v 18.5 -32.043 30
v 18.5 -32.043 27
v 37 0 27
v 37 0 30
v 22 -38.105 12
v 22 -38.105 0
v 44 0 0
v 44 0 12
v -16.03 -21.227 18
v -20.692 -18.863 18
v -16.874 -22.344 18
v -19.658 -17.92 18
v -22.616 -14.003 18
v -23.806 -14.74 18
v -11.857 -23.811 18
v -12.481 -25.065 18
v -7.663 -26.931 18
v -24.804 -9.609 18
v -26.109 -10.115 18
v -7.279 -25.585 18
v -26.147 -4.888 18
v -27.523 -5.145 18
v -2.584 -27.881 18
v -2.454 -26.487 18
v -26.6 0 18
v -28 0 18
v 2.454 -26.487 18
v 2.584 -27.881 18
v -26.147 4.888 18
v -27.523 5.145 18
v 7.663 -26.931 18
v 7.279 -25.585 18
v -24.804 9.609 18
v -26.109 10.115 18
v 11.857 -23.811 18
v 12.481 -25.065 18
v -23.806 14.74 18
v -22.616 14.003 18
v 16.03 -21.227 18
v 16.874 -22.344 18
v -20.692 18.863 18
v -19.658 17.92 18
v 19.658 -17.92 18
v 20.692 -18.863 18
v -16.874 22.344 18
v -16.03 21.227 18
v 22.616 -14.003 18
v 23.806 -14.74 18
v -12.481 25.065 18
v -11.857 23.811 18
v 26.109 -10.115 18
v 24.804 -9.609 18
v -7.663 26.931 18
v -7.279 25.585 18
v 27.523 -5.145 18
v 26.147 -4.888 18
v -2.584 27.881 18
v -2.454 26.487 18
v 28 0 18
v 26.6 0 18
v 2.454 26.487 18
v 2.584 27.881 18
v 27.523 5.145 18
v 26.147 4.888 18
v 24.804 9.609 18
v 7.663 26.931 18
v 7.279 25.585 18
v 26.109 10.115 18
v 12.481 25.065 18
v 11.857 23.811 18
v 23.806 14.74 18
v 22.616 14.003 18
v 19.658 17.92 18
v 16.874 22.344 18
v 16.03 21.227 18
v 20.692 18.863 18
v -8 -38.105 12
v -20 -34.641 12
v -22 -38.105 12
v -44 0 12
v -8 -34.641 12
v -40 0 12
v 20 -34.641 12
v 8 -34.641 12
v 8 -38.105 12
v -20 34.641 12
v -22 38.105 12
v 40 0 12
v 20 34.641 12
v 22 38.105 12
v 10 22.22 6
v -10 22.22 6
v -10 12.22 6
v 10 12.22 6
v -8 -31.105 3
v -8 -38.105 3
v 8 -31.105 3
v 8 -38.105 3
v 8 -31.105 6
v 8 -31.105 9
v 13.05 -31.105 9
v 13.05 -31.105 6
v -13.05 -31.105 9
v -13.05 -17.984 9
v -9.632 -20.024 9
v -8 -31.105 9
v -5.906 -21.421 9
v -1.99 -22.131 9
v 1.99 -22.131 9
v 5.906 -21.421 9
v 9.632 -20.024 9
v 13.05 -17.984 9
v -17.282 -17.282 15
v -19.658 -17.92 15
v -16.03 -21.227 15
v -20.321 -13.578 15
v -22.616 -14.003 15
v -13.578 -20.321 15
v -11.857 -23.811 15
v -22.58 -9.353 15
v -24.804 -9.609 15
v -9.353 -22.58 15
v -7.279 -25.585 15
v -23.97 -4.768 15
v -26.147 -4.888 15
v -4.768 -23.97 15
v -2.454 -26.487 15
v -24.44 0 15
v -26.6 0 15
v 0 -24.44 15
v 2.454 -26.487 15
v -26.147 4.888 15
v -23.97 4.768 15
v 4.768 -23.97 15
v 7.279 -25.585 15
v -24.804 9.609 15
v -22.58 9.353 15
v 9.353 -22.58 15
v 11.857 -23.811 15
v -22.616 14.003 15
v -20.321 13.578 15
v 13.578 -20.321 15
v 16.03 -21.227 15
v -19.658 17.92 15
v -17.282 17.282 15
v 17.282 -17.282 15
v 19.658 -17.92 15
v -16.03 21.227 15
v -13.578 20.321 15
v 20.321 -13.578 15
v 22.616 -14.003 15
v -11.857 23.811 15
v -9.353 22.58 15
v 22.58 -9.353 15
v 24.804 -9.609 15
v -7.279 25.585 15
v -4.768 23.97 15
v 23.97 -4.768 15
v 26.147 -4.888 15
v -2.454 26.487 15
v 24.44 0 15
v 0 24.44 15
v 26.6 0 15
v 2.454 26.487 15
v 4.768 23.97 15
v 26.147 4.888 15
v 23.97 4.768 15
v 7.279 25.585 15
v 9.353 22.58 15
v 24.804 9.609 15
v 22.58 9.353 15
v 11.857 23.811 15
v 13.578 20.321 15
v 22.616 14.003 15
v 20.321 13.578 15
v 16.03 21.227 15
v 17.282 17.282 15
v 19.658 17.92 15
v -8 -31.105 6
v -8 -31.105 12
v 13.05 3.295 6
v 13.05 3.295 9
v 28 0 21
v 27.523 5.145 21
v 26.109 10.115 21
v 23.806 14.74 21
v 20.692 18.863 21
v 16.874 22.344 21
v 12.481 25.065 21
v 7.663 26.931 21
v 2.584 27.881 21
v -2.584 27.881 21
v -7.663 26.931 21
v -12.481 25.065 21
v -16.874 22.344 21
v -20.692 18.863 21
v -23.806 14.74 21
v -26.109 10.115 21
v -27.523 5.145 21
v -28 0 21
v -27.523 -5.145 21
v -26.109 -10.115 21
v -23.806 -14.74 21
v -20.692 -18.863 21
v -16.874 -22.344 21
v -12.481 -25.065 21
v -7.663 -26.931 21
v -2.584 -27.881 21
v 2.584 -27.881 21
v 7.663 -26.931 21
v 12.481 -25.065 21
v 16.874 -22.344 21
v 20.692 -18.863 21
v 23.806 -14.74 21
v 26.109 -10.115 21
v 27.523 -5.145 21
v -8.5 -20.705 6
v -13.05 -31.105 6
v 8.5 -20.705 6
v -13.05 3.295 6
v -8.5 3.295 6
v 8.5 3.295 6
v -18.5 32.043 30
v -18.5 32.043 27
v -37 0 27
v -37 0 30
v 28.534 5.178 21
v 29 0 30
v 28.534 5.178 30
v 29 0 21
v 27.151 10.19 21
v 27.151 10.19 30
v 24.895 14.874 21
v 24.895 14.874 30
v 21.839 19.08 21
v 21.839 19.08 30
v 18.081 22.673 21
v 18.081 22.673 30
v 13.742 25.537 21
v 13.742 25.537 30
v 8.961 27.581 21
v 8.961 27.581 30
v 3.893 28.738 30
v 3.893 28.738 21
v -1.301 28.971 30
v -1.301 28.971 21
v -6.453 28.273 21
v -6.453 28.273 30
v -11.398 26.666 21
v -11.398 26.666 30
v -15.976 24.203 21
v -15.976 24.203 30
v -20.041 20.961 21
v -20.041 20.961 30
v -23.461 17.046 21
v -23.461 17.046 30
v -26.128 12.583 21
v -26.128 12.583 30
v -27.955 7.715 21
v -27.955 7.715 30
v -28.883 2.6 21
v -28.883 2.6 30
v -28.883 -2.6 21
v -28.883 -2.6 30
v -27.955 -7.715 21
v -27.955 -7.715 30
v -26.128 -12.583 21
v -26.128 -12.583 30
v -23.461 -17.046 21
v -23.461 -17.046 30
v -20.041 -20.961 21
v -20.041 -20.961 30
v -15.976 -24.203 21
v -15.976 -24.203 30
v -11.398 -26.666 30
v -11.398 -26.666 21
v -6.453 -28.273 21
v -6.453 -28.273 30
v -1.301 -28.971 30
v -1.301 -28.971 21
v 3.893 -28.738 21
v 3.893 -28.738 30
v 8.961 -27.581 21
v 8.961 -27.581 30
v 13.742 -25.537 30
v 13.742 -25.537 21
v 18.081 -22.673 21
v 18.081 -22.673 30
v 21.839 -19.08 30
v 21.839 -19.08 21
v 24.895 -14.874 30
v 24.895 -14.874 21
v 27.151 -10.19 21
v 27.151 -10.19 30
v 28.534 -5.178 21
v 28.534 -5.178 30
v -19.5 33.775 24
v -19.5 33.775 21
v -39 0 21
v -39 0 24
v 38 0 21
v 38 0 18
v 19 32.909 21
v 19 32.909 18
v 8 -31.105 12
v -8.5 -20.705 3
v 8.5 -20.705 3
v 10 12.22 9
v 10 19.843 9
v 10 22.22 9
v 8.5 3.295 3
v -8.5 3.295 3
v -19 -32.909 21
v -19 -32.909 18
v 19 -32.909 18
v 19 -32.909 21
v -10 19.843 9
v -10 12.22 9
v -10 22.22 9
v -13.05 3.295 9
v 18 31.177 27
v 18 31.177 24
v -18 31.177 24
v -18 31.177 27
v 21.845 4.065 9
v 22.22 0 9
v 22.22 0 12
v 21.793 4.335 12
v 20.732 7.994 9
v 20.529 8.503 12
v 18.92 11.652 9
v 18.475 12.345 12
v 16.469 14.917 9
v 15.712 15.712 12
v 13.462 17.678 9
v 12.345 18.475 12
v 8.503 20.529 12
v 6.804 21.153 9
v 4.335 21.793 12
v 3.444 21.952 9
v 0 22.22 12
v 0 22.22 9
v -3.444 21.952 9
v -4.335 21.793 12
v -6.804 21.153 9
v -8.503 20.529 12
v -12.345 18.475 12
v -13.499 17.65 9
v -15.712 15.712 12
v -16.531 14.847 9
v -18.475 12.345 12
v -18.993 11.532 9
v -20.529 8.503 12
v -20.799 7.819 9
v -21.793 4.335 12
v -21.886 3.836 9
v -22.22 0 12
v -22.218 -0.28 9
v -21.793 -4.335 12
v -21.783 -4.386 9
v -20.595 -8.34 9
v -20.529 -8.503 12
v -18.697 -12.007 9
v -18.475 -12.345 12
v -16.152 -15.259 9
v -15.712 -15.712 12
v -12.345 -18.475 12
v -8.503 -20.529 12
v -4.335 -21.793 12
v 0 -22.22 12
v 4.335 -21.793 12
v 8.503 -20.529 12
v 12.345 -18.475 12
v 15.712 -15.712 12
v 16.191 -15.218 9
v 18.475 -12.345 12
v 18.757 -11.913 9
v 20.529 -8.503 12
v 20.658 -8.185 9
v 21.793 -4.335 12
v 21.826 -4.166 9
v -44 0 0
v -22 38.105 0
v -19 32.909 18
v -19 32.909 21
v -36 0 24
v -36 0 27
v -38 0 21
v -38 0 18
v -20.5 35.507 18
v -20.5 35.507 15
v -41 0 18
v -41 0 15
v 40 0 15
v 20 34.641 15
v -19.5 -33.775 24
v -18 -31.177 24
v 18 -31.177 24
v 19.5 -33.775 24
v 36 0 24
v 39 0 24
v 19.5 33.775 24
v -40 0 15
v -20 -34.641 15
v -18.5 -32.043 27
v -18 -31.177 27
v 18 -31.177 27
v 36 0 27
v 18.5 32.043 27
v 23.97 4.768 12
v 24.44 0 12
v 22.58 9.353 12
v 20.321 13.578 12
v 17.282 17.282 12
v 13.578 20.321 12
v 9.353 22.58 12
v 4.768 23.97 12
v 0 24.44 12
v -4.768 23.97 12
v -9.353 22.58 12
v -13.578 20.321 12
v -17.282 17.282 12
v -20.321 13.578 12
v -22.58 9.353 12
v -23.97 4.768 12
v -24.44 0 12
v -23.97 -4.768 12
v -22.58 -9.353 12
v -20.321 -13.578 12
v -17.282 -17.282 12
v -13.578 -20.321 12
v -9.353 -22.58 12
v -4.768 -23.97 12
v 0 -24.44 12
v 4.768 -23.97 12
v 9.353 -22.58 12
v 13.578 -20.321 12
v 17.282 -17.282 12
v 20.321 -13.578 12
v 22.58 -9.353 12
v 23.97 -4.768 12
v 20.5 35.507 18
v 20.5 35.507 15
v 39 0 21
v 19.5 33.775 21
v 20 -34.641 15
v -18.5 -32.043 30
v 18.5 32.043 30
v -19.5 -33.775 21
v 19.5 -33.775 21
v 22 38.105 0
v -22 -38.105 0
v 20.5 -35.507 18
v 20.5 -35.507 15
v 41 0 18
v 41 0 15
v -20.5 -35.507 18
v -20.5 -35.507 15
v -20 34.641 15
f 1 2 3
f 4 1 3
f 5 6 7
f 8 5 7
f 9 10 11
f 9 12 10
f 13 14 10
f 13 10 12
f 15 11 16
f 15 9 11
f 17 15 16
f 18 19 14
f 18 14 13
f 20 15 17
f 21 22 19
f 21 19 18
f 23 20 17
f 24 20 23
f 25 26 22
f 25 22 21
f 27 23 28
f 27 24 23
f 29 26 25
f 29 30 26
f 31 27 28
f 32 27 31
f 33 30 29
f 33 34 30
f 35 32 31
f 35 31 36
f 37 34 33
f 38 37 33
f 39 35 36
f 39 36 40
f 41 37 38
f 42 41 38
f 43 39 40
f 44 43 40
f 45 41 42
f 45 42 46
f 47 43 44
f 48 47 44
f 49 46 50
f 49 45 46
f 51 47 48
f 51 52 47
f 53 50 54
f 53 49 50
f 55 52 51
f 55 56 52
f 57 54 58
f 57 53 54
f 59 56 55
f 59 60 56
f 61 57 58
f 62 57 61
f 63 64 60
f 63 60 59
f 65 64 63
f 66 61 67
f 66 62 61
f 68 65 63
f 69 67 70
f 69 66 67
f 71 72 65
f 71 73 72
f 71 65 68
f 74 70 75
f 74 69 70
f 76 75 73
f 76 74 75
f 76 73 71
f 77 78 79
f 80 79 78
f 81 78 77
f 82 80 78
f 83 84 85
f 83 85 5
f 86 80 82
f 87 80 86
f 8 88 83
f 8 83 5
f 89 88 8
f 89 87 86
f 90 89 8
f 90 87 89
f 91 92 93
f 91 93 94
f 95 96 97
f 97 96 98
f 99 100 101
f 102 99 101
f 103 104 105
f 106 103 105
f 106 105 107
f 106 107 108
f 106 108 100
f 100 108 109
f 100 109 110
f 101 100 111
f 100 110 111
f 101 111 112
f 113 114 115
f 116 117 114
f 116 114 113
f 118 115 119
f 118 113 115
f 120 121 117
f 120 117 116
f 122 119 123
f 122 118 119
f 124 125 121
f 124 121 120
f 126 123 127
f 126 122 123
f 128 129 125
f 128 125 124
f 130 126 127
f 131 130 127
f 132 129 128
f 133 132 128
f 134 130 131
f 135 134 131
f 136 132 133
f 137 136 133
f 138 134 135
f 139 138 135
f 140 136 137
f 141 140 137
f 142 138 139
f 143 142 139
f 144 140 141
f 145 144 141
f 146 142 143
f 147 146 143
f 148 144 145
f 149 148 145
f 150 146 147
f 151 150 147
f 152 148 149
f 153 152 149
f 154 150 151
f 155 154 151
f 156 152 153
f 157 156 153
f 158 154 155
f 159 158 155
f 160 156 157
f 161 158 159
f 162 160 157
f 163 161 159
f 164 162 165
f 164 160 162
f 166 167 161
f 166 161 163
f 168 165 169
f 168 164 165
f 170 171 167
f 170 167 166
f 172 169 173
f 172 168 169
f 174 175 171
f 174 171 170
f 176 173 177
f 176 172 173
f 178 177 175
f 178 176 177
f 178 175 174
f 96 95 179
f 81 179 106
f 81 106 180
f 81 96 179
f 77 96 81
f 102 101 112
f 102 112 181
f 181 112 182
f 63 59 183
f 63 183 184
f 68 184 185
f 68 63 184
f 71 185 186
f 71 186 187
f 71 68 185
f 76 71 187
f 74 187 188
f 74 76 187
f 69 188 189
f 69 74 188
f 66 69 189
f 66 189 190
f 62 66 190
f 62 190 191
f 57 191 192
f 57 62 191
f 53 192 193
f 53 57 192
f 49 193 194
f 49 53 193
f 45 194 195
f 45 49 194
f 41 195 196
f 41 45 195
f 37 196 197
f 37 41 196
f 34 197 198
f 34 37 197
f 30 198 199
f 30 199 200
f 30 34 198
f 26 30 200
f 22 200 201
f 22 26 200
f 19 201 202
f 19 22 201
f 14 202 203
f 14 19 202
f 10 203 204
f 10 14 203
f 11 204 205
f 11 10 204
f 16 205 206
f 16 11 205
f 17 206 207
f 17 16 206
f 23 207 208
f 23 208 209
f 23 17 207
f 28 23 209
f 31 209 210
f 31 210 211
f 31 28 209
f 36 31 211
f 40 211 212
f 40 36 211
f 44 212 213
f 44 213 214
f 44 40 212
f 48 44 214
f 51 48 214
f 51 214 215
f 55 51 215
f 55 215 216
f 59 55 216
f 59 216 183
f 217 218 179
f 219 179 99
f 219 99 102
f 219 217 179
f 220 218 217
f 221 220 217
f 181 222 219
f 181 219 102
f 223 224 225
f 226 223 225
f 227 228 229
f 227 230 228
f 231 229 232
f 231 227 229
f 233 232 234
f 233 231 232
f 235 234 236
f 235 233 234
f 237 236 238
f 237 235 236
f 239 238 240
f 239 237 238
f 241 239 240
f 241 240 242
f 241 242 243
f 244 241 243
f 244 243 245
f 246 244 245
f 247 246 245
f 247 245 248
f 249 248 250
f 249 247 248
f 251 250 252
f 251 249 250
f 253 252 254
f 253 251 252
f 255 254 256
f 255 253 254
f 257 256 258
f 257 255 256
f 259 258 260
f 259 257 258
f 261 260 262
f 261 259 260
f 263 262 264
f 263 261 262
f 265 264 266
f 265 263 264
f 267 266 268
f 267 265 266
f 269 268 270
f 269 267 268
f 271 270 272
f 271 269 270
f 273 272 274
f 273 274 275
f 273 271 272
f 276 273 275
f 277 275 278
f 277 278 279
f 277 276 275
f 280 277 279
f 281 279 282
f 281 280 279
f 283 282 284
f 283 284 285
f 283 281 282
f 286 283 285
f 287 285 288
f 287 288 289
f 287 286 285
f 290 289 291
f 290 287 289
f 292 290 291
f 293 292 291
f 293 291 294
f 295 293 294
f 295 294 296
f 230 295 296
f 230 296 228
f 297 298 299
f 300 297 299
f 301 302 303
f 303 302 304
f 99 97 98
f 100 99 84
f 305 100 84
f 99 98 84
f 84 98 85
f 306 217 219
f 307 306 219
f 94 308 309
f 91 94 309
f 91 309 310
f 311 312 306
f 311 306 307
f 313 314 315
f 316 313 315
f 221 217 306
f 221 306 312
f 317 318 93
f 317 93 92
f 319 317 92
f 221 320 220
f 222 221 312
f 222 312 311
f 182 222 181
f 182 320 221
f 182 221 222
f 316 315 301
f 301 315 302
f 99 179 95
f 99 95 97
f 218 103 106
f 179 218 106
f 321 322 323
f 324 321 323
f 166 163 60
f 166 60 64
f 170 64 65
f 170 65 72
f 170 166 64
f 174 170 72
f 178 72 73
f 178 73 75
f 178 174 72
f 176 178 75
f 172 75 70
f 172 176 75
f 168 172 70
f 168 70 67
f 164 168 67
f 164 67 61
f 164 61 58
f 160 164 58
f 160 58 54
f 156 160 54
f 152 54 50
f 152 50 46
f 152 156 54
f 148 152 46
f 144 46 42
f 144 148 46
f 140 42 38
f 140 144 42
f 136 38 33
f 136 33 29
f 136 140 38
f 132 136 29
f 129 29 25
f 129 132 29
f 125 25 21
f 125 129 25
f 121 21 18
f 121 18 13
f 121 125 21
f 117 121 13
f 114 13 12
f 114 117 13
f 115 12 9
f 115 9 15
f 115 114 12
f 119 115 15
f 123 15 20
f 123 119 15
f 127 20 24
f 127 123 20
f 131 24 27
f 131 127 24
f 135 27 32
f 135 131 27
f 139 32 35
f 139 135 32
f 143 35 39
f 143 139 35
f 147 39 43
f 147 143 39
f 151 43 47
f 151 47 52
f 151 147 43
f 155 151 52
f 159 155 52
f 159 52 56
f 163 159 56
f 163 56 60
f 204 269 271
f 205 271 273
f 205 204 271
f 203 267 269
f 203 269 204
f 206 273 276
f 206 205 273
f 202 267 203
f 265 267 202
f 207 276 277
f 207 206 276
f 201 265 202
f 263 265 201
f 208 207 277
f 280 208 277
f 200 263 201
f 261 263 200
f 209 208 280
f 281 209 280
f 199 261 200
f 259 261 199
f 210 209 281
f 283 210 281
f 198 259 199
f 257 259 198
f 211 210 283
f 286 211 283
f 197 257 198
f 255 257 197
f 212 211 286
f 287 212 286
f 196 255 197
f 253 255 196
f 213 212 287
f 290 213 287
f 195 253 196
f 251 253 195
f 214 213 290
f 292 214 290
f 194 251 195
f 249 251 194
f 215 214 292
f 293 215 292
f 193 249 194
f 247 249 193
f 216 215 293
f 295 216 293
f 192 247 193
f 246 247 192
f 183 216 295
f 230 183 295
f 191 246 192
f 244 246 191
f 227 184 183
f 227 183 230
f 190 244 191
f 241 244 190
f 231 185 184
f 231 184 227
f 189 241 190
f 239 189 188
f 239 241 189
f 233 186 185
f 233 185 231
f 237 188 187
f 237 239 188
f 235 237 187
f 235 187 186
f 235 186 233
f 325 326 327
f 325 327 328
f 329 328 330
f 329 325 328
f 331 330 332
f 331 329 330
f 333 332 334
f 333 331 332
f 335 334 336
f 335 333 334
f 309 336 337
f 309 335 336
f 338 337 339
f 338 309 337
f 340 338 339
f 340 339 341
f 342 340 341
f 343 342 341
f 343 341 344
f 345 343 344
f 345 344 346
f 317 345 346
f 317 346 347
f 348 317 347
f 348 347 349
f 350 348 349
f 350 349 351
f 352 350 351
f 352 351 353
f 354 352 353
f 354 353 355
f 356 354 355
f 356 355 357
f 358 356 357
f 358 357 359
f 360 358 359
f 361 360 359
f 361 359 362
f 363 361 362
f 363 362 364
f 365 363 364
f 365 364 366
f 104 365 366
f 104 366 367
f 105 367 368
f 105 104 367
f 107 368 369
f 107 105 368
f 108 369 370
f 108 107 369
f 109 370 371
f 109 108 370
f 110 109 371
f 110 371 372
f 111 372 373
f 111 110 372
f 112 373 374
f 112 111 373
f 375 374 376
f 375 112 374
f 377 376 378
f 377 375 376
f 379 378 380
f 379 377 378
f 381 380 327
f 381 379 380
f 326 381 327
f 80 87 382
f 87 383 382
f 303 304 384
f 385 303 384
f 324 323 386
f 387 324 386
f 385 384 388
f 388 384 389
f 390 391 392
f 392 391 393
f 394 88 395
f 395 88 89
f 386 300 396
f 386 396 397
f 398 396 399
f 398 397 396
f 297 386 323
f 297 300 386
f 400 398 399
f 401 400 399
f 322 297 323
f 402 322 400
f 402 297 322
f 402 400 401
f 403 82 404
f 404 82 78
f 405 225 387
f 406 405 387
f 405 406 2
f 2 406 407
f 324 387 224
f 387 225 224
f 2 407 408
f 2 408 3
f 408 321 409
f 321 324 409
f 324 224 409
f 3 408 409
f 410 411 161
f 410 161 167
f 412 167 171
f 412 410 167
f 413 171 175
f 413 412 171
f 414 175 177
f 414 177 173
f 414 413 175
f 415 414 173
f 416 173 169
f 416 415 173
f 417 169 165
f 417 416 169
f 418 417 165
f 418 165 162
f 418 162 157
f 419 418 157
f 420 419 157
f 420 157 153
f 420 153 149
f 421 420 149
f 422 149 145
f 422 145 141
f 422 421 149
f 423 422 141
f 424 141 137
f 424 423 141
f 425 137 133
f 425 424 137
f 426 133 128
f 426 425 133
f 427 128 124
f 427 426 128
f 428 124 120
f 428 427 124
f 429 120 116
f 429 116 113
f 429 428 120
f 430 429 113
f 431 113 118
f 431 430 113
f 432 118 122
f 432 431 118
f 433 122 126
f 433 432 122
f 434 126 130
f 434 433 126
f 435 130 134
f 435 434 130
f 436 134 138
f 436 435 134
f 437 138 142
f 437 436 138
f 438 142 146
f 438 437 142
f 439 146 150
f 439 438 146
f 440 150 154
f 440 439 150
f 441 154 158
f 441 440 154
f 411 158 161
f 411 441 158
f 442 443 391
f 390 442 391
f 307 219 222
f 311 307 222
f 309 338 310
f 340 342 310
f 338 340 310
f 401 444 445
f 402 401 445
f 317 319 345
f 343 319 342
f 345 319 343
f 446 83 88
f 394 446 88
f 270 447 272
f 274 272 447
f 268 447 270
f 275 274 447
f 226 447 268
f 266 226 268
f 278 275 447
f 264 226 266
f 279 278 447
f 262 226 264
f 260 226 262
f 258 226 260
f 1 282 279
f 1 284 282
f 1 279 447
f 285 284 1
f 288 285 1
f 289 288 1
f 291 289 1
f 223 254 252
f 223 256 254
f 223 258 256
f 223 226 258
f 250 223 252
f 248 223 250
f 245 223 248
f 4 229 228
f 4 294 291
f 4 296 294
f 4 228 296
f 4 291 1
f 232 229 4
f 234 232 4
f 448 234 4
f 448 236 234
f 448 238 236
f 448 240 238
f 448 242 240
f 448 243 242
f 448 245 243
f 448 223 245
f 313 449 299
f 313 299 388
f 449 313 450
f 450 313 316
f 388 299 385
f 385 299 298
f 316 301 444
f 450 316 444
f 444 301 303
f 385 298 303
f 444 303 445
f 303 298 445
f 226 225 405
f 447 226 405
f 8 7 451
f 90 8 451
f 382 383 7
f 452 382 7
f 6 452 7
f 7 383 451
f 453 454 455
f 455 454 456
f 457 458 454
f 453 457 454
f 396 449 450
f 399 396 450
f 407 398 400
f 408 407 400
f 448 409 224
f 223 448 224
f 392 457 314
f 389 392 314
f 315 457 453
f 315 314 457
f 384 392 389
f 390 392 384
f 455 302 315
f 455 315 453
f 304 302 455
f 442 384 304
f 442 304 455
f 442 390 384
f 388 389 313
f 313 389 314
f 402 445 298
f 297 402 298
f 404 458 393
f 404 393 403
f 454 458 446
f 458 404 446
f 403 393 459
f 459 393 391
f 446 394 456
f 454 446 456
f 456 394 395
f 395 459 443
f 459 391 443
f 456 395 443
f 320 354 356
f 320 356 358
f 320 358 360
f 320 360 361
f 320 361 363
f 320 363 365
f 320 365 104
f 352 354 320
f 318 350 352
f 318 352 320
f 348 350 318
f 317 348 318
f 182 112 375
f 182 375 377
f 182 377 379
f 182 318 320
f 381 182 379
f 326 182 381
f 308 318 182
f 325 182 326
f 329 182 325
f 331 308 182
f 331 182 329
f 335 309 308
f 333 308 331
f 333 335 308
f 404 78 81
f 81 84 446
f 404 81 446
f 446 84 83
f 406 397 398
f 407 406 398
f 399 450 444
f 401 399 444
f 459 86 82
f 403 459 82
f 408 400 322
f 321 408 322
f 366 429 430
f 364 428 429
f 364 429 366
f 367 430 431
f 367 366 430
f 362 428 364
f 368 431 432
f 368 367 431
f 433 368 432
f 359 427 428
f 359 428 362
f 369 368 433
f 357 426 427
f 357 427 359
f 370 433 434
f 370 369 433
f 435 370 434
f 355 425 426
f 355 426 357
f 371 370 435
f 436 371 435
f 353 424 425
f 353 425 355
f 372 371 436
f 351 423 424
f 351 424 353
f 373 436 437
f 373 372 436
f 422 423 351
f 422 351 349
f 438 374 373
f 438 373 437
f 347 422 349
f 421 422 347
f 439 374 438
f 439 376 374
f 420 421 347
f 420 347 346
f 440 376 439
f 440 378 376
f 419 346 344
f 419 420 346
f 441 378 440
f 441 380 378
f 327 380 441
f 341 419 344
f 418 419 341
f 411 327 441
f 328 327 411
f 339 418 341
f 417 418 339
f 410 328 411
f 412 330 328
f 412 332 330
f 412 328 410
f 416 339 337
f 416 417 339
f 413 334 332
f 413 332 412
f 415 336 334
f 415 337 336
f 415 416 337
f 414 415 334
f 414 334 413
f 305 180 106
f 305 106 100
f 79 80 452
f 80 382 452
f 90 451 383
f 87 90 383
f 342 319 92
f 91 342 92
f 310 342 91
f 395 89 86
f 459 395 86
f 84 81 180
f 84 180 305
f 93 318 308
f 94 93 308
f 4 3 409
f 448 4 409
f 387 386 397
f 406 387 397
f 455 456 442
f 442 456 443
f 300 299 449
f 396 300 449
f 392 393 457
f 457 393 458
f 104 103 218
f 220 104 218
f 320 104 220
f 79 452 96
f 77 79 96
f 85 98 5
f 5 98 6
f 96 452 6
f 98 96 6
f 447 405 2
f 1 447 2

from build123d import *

# Parameters (mm, degrees)
PAD_DEPTH       = 9
SKETCH001_W     = 26.1
SKETCH001_H     = 34.4
POCKET_DEPTH    = 3
SKETCH002_R     = 22.22
PAD001_DEPTH    = 3
SKETCH003_R     = 24.44
PAD002_DEPTH    = 3
SKETCH004_R     = 26.6
PAD003_DEPTH    = 3
SKETCH005_R     = 28
PAD004_DEPTH    = 3
SKETCH006_R     = 29
PAD005_DEPTH    = 3
SKETCH007_R     = 29
PAD006_DEPTH    = 3
SKETCH008_R     = 29
PAD007_DEPTH    = 3
SKETCH009_W     = 17
SKETCH009_H     = 24
POCKET001_DEPTH = 3
SKETCH010_W     = 16
SKETCH010_H     = 9
POCKET002_DEPTH = 7
SKETCH011_W     = 20
SKETCH011_H     = 10
POCKET003_DEPTH = 3


with BuildPart() as part:
    # Sketch → Pad (new body)
    with BuildSketch(Plane.XY):
        Polygon((44, 0), (22, 38.105118), (-22, 38.105118), (-44, 0), (-22, -38.105118), (22, -38.105118), align=None)
    extrude(amount=PAD_DEPTH)

    # Sketch001 (on Face8 of Pad) → Pocket (cut)
    with BuildSketch(Plane.XY.offset(9)):
        with Locations((0, -13.905118)):
            Rectangle(SKETCH001_W, SKETCH001_H)
    extrude(amount=-POCKET_DEPTH, mode=Mode.SUBTRACT)

    # Sketch002 (on Face5 of Pocket) → Pad001 (join)
    with BuildSketch(Plane.XY.offset(9)):
        Polygon((22, 38.105118), (-22, 38.105118), (-44, 0), (-22, -38.105118), (22, -38.105118), (44, 0), align=None)
        Circle(SKETCH002_R, mode=Mode.SUBTRACT)
    extrude(amount=PAD001_DEPTH)

    # Sketch003 (on Face14 of Pad001) → Pad002 (join)
    with BuildSketch(Plane.XY.offset(12)):
        Polygon((40, 0), (20, 34.641016), (-20, 34.641016), (-40, 0), (-20, -34.641016), (20, -34.641016), align=None)
        Circle(SKETCH003_R, mode=Mode.SUBTRACT)
    extrude(amount=PAD002_DEPTH)

    # Sketch004 (on Face21 of Pad002) → Pad003 (join)
    with BuildSketch(Plane.XY.offset(15)):
        Polygon((41, 0), (20.5, 35.507042), (-20.5, 35.507042), (-41, 0), (-20.5, -35.507042), (20.5, -35.507042), align=None)
        Circle(SKETCH004_R, mode=Mode.SUBTRACT)
    extrude(amount=PAD003_DEPTH)

    # Sketch005 (on Face28 of Pad003) → Pad004 (join)
    with BuildSketch(Plane.XY.offset(18)):
        Polygon((19, 32.908965), (-19, 32.908965), (-38, 0), (-19, -32.908965), (19, -32.908965), (38, 0), align=None)
        Circle(SKETCH005_R, mode=Mode.SUBTRACT)
    extrude(amount=PAD004_DEPTH)

    # Sketch006 (on Face35 of Pad004) → Pad005 (join)
    with BuildSketch(Plane.XY.offset(21)):
        Polygon((39, 0), (19.5, 33.774991), (-19.5, 33.774991), (-39, 0), (-19.5, -33.774991), (19.5, -33.774991), align=None)
        Circle(SKETCH006_R, mode=Mode.SUBTRACT)
    extrude(amount=PAD005_DEPTH)

    # Sketch007 (on Face42 of Pad005) → Pad006 (join)
    with BuildSketch(Plane.XY.offset(24)):
        Polygon((36, 0), (18, 31.176915), (-18, 31.176915), (-36, 0), (-18, -31.176915), (18, -31.176915), align=None)
        Circle(SKETCH007_R, mode=Mode.SUBTRACT)
    extrude(amount=PAD006_DEPTH)

    # Sketch008 (on Face49 of Pad006) → Pad007 (join)
    with BuildSketch(Plane.XY.offset(27)):
        Polygon((37, 0), (18.5, 32.04294), (-18.5, 32.04294), (-37, 0), (-18.5, -32.04294), (18.5, -32.04294), align=None)
        Circle(SKETCH008_R, mode=Mode.SUBTRACT)
    extrude(amount=PAD007_DEPTH)

    # Sketch009 (on Face74 of Pad007) → Pocket001 (cut)
    with BuildSketch(Plane.XY.offset(6)):
        with Locations((0, -8.705118)):
            Rectangle(SKETCH009_W, SKETCH009_H)
    extrude(amount=-POCKET001_DEPTH, mode=Mode.SUBTRACT)

    # Sketch010 (on Face12 of Pocket001) → Pocket002 (cut)
    with BuildSketch(Plane.XZ.offset(38.105118)):
        with Locations((0, 7.5)):
            Rectangle(SKETCH010_W, SKETCH010_H)
    extrude(amount=-POCKET002_DEPTH, mode=Mode.SUBTRACT)

    # Sketch011 (on Face40 of Pocket002) → Pocket003 (cut)
    with BuildSketch(Plane.XY.offset(9)):
        with Locations((0, 17.22)):
            Rectangle(SKETCH011_W, SKETCH011_H)
    extrude(amount=-POCKET003_DEPTH, mode=Mode.SUBTRACT)


solid = part.part
